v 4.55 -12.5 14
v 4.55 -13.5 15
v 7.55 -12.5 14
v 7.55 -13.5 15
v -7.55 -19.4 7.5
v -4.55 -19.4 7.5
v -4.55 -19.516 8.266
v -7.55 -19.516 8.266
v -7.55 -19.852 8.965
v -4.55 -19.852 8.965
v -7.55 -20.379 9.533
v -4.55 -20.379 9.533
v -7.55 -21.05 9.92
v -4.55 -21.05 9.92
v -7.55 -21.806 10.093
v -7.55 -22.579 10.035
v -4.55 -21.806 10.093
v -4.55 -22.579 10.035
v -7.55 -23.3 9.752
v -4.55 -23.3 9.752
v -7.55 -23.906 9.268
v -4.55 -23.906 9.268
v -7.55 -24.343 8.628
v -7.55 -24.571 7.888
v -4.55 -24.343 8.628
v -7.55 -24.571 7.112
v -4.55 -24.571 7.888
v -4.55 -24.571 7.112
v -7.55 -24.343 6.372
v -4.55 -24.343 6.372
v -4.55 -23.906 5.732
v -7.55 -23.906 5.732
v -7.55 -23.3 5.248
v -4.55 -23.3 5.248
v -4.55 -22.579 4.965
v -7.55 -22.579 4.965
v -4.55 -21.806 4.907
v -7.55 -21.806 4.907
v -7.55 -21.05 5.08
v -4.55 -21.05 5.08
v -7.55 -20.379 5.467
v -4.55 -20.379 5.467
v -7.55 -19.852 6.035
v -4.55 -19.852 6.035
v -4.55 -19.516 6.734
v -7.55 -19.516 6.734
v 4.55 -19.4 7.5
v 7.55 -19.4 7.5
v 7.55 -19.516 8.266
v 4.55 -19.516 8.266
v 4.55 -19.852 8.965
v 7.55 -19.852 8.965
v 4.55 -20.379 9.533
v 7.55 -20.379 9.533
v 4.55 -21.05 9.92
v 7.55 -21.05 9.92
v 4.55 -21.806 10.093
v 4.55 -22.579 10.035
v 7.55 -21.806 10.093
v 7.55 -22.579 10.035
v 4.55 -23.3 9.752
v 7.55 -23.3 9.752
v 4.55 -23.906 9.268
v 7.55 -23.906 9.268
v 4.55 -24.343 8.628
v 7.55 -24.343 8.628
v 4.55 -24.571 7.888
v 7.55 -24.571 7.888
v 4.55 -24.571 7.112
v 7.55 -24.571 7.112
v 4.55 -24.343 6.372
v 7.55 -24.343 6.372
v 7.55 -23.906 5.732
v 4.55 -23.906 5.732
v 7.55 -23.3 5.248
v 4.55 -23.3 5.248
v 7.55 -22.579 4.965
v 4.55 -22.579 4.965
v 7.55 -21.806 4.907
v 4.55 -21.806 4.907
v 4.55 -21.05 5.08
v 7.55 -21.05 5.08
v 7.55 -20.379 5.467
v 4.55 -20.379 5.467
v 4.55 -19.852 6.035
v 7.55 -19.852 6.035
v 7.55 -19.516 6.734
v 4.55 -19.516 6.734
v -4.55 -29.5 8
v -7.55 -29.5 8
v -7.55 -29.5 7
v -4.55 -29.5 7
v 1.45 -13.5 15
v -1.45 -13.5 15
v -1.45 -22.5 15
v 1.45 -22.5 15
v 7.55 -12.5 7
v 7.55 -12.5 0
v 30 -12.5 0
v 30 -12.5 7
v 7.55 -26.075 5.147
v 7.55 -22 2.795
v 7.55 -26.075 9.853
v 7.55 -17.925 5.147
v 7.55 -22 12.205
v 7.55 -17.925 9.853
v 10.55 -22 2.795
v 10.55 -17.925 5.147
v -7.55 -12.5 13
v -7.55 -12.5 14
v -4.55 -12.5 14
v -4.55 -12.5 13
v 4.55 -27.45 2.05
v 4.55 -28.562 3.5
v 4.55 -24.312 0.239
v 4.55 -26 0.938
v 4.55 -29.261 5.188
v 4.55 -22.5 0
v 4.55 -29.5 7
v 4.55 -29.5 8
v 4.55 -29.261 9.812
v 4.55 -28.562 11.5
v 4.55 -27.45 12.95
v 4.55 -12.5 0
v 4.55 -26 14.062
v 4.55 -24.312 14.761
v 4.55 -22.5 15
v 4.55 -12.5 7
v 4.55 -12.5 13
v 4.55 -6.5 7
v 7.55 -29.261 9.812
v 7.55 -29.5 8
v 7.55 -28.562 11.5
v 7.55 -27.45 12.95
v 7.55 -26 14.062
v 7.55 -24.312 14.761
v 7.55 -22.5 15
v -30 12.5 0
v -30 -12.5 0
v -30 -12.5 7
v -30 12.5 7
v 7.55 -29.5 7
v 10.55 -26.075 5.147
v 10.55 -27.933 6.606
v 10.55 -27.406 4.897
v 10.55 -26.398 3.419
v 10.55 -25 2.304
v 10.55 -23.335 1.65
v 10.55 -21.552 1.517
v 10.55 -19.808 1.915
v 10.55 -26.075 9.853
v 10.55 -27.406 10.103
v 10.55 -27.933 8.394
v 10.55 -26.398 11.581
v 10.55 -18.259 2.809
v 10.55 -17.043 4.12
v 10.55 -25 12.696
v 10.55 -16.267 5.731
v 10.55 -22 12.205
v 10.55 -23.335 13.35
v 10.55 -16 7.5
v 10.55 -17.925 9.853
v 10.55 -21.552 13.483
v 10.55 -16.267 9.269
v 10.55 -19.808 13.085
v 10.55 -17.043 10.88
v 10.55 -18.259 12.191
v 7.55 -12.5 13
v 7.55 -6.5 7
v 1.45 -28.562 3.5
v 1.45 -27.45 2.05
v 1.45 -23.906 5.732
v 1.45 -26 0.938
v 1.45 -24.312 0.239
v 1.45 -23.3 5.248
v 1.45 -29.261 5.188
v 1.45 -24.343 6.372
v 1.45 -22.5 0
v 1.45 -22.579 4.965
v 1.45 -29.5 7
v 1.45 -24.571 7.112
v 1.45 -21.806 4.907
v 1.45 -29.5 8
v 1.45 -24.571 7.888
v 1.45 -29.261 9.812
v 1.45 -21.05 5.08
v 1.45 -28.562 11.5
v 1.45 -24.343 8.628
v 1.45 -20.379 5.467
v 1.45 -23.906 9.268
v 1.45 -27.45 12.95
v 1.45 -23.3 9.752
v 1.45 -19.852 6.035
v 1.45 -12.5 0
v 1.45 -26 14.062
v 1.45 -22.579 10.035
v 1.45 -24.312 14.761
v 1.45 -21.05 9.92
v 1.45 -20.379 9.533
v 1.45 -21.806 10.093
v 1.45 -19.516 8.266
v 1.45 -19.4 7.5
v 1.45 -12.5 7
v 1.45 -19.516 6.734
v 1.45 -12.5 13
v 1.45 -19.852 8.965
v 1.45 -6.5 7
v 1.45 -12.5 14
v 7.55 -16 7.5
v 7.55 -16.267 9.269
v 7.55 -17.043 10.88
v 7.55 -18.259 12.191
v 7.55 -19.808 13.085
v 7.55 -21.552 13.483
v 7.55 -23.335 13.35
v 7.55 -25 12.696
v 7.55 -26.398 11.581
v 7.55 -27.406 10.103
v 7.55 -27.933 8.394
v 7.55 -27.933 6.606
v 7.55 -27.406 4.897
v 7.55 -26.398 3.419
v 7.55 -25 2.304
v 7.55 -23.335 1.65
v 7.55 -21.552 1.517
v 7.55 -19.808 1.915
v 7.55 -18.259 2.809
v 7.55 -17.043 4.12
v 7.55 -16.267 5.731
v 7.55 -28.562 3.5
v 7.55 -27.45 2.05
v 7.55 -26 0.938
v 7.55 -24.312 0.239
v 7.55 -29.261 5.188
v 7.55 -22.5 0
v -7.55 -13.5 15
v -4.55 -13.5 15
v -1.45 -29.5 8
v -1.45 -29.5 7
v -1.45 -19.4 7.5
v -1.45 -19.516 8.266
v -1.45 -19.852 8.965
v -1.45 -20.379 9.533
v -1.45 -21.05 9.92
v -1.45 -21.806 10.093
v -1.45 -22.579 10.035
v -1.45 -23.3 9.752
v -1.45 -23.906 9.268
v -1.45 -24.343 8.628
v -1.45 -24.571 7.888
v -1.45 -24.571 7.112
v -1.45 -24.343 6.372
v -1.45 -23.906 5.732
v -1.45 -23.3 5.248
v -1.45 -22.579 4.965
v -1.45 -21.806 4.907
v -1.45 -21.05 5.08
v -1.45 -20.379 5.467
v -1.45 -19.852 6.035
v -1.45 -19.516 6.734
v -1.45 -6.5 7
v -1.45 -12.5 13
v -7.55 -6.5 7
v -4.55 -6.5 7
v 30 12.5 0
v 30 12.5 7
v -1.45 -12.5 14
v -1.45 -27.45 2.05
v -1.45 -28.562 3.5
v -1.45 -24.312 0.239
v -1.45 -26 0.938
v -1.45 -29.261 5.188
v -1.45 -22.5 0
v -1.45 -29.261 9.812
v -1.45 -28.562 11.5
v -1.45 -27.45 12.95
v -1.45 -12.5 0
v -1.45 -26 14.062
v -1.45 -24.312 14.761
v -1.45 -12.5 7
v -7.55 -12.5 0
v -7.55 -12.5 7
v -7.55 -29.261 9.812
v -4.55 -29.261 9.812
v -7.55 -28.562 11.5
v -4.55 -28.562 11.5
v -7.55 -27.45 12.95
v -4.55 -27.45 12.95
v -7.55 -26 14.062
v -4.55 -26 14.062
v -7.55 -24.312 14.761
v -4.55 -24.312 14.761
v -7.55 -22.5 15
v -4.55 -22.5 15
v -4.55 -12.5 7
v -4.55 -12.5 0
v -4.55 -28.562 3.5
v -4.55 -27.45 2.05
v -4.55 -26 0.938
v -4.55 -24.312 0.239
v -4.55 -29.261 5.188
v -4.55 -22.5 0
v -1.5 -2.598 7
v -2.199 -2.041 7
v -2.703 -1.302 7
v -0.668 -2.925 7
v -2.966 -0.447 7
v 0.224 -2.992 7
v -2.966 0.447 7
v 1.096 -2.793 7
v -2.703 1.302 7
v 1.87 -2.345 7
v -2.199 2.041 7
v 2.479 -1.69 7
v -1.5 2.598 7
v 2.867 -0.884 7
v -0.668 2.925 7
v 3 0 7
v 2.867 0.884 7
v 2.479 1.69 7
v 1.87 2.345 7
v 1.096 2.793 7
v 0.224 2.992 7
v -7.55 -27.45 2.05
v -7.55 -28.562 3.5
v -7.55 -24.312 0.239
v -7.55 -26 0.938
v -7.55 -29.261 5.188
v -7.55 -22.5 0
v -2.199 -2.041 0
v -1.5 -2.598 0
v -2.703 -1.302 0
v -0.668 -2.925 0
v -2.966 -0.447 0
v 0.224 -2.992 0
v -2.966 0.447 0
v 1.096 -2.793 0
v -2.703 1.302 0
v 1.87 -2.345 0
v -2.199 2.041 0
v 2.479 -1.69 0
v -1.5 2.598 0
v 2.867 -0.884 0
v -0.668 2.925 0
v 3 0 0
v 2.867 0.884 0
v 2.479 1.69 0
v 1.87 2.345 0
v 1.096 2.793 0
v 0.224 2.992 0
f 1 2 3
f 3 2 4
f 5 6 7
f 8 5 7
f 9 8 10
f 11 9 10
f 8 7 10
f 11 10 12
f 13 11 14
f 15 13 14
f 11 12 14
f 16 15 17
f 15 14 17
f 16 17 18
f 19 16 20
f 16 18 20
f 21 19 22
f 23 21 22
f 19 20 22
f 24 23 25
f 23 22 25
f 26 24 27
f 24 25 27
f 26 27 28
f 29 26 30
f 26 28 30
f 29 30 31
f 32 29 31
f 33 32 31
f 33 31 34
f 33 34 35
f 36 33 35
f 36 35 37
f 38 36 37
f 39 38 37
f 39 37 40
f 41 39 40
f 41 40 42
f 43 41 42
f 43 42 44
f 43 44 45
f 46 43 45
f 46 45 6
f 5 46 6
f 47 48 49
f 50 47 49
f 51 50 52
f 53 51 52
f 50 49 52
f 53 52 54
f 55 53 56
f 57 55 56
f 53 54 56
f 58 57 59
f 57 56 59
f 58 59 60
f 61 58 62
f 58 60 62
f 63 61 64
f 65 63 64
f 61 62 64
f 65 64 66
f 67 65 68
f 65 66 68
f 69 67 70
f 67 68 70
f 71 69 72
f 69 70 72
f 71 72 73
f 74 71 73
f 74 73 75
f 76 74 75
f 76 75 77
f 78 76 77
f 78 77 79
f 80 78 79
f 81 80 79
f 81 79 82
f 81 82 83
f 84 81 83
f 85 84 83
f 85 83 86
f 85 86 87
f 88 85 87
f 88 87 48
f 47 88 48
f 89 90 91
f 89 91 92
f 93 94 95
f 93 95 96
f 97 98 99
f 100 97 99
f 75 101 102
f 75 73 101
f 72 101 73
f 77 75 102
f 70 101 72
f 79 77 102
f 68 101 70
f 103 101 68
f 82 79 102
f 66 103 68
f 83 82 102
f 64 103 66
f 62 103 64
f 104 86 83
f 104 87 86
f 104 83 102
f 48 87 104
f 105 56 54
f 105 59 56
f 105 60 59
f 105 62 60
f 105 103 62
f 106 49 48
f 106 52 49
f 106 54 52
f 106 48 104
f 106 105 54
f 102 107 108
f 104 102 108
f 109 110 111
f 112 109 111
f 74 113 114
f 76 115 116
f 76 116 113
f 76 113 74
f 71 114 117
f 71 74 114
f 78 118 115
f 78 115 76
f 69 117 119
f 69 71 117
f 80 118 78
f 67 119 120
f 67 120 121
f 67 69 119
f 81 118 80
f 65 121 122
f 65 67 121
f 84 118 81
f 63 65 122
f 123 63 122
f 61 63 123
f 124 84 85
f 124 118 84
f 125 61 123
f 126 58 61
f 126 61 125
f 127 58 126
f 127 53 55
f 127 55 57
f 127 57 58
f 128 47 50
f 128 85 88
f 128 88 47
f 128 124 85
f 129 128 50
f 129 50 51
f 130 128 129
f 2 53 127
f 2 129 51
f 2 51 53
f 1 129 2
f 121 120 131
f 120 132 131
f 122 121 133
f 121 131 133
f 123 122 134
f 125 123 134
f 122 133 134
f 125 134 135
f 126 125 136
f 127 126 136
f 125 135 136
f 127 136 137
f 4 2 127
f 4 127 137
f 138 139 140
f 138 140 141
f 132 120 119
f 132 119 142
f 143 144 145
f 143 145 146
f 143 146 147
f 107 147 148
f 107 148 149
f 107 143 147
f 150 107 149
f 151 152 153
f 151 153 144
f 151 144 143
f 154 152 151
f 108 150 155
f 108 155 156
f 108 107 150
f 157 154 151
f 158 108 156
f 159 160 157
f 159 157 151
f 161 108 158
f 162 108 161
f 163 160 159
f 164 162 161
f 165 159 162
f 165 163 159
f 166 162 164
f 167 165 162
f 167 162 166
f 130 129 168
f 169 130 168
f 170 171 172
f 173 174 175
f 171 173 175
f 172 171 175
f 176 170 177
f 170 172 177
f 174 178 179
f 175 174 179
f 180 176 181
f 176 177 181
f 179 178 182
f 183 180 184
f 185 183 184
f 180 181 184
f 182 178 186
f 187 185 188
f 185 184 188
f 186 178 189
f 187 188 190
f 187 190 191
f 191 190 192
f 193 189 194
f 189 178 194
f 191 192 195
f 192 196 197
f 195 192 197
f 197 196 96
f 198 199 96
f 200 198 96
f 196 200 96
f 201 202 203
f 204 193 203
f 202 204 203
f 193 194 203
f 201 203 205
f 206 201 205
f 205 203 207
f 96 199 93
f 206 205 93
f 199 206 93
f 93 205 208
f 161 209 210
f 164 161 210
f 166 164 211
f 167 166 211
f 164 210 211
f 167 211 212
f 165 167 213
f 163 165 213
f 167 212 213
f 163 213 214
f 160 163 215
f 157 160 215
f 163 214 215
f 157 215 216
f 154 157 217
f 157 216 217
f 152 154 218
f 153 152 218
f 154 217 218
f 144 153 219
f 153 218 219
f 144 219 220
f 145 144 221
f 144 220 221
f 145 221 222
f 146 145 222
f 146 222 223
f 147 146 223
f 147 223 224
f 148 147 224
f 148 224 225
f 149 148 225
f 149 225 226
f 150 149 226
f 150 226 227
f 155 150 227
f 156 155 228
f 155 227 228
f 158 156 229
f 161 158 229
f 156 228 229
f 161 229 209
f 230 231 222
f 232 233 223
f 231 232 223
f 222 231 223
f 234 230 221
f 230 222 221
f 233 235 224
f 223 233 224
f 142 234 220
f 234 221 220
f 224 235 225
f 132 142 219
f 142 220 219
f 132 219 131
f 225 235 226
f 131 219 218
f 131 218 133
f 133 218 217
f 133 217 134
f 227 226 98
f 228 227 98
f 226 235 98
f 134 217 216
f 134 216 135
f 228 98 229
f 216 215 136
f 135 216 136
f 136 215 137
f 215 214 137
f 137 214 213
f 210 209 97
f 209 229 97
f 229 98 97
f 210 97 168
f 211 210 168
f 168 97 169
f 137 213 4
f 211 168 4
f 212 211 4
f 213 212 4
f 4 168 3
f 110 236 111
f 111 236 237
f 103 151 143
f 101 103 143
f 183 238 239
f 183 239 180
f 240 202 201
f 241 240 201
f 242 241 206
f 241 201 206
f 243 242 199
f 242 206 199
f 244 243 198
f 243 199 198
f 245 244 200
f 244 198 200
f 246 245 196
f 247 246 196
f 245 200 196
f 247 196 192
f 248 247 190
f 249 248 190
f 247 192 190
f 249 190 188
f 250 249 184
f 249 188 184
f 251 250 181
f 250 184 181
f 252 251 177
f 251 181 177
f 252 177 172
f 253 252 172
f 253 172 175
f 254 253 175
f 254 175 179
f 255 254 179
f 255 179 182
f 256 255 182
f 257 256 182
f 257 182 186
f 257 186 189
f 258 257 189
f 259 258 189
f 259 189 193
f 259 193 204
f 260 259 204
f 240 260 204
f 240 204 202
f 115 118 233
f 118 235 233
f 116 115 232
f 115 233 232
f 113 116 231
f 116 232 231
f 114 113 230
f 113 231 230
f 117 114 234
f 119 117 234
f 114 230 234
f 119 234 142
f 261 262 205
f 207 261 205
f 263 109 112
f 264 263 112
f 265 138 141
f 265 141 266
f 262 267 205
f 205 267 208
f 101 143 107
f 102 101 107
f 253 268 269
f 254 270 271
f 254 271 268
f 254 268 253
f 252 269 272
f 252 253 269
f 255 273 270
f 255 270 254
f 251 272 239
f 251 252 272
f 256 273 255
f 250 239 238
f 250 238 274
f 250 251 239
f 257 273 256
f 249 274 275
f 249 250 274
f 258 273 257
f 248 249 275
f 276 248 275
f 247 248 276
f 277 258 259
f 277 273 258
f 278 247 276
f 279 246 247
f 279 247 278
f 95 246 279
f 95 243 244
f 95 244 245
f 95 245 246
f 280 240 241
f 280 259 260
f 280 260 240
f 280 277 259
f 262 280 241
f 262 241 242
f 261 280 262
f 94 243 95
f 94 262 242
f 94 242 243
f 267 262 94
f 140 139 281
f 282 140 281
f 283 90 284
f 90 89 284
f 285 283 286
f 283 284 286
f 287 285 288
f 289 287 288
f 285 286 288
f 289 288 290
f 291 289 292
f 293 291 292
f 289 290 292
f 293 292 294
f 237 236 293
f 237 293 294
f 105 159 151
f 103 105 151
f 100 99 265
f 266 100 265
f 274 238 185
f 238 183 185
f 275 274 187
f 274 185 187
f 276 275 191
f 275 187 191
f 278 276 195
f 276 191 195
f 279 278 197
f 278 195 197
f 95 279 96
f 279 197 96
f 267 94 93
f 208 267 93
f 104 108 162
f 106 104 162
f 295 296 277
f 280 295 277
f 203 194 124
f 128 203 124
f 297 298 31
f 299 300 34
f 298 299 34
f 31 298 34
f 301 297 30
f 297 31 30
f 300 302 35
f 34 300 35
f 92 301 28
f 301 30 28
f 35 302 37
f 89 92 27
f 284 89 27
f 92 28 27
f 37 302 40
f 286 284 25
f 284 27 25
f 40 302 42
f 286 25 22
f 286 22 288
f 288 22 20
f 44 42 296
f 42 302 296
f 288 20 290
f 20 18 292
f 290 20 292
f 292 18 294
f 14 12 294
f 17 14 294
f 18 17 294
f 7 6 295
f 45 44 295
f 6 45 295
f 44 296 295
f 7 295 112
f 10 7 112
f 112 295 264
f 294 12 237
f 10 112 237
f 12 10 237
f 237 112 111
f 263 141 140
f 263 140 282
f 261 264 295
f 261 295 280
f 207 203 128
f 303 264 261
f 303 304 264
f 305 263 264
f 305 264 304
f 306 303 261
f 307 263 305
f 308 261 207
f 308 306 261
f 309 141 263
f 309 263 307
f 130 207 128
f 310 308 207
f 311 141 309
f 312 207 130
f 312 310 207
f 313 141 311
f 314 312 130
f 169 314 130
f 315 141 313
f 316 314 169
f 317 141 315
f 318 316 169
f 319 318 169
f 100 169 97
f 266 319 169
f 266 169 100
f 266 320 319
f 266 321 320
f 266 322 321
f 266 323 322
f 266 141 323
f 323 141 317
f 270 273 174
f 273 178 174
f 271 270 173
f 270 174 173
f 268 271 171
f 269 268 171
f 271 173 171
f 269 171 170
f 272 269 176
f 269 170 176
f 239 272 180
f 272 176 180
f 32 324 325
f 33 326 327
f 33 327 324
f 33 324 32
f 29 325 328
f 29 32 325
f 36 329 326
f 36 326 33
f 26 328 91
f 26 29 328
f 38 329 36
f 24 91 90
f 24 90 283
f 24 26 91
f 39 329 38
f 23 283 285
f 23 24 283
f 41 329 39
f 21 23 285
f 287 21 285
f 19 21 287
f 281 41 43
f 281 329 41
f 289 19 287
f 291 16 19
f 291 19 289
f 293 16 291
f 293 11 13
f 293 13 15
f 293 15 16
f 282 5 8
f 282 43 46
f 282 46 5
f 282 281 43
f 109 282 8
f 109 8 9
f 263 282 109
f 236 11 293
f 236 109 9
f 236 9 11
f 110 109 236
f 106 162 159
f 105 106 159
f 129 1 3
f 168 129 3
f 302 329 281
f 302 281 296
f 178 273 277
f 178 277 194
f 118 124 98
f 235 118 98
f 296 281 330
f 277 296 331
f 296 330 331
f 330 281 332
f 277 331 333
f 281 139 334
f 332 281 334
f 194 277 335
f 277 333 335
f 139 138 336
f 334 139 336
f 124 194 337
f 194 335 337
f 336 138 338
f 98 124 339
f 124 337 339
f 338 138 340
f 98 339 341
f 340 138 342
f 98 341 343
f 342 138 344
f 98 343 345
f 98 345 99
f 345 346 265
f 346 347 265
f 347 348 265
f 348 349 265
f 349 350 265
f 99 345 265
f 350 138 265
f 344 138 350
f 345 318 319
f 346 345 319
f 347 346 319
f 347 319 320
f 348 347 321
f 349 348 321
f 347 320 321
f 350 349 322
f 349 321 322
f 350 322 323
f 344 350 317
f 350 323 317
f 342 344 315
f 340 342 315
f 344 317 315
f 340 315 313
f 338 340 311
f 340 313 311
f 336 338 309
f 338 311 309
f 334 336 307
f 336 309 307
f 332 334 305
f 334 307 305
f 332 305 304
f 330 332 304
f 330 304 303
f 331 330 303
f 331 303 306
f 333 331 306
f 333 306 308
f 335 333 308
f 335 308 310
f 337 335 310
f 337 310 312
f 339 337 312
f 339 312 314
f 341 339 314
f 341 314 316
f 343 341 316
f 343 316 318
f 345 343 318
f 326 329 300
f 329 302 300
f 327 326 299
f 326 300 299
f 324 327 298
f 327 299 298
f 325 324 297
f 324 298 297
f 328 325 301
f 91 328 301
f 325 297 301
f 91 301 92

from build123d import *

# Parameters (mm, degrees)
SKETCH_W        = 60
SKETCH_H        = 25
PAD_DEPTH       = 7
SKETCH002_R     = 3
POCKET_DEPTH    = 7.001
SKETCH003_W     = 2.9
SKETCH003_H     = 15
SKETCH003_W_2   = 3
PAD001_DEPTH    = 17
SKETCH005_R     = 6
PAD002_DEPTH    = 3
POCKET001_DEPTH = 3
SKETCH007_R     = 2.6
POCKET002_DEPTH = 37.551
FILLET_R        = 7
CHAMFER_SIZE    = 6
CHAMFER001_SIZE = 1


with BuildPart() as part:
    # Sketch → Pad (new body)
    with BuildSketch(Plane.XY):
        Rectangle(SKETCH_W, SKETCH_H)
    extrude(amount=PAD_DEPTH)

    # Sketch002 (on Face6 of Pad) → Pocket (cut, through all)
    with BuildSketch(Plane.XY.offset(7)):
        Circle(SKETCH002_R)
    extrude(amount=-POCKET_DEPTH, mode=Mode.SUBTRACT)

    # Sketch003 (on Face6 of Pocket) → Pad001 (join)
    with BuildSketch(Plane.XZ.offset(12.5)):
        with Locations((0, 7.5)):
            Rectangle(SKETCH003_W, SKETCH003_H)
        with Locations((6.05, 7.5)):
            Rectangle(SKETCH003_W_2, SKETCH003_H)
        with Locations((-6.05, 7.5)):
            Rectangle(SKETCH003_W_2, SKETCH003_H)
    extrude(amount=PAD001_DEPTH)

    # Sketch005 (on Face18 of Pad001) → Pad002 (join)
    with BuildSketch(Plane.YZ.offset(7.55)):
        with Locations((-22, 7.5)):
            Circle(SKETCH005_R)
    extrude(amount=PAD002_DEPTH)

    # Sketch006 (on Face30 of Pad002) → Pocket001 (cut)
    with BuildSketch(Plane.YZ.offset(10.55)):
        Polygon((-17.925, 9.852702), (-22, 12.205405), (-26.075, 9.852702), (-26.075, 5.147298), (-22, 2.794595), (-17.925, 5.147298), align=None)
    extrude(amount=-POCKET001_DEPTH, mode=Mode.SUBTRACT)

    # Sketch007 (on Face37 of Pocket001) → Pocket002 (cut, through all)
    with BuildSketch(Plane.YZ.offset(7.55)):
        with Locations((-22, 7.5)):
            Circle(SKETCH007_R)
    extrude(amount=-POCKET002_DEPTH, mode=Mode.SUBTRACT)

    # Fillet
    fillet_edges = [part.edges().sort_by_distance(p)[0] for p in [
        (0, -29.5, 15),
        (-6.05, -29.5, 15),
        (6.05, -29.5, 15),
        (6.05, -29.5, 0),
        (0, -29.5, 0),
        (-6.05, -29.5, 0),
    ]]
    fillet(fillet_edges, radius=FILLET_R)

    # Chamfer
    chamfer_edges = [part.edges().sort_by_distance(p)[0] for p in [
        (6.05, -12.5, 7),
        (0, -12.5, 7),
        (-6.05, -12.5, 7),
    ]]
    chamfer(chamfer_edges, length=CHAMFER_SIZE)

    # Chamfer001
    chamfer001_edges = [part.edges().sort_by_distance(p)[0] for p in [
        (6.05, -12.5, 15),
        (0, -12.5, 15),
        (-6.05, -12.5, 15),
    ]]
    chamfer(chamfer001_edges, length=CHAMFER001_SIZE)


solid = part.part
